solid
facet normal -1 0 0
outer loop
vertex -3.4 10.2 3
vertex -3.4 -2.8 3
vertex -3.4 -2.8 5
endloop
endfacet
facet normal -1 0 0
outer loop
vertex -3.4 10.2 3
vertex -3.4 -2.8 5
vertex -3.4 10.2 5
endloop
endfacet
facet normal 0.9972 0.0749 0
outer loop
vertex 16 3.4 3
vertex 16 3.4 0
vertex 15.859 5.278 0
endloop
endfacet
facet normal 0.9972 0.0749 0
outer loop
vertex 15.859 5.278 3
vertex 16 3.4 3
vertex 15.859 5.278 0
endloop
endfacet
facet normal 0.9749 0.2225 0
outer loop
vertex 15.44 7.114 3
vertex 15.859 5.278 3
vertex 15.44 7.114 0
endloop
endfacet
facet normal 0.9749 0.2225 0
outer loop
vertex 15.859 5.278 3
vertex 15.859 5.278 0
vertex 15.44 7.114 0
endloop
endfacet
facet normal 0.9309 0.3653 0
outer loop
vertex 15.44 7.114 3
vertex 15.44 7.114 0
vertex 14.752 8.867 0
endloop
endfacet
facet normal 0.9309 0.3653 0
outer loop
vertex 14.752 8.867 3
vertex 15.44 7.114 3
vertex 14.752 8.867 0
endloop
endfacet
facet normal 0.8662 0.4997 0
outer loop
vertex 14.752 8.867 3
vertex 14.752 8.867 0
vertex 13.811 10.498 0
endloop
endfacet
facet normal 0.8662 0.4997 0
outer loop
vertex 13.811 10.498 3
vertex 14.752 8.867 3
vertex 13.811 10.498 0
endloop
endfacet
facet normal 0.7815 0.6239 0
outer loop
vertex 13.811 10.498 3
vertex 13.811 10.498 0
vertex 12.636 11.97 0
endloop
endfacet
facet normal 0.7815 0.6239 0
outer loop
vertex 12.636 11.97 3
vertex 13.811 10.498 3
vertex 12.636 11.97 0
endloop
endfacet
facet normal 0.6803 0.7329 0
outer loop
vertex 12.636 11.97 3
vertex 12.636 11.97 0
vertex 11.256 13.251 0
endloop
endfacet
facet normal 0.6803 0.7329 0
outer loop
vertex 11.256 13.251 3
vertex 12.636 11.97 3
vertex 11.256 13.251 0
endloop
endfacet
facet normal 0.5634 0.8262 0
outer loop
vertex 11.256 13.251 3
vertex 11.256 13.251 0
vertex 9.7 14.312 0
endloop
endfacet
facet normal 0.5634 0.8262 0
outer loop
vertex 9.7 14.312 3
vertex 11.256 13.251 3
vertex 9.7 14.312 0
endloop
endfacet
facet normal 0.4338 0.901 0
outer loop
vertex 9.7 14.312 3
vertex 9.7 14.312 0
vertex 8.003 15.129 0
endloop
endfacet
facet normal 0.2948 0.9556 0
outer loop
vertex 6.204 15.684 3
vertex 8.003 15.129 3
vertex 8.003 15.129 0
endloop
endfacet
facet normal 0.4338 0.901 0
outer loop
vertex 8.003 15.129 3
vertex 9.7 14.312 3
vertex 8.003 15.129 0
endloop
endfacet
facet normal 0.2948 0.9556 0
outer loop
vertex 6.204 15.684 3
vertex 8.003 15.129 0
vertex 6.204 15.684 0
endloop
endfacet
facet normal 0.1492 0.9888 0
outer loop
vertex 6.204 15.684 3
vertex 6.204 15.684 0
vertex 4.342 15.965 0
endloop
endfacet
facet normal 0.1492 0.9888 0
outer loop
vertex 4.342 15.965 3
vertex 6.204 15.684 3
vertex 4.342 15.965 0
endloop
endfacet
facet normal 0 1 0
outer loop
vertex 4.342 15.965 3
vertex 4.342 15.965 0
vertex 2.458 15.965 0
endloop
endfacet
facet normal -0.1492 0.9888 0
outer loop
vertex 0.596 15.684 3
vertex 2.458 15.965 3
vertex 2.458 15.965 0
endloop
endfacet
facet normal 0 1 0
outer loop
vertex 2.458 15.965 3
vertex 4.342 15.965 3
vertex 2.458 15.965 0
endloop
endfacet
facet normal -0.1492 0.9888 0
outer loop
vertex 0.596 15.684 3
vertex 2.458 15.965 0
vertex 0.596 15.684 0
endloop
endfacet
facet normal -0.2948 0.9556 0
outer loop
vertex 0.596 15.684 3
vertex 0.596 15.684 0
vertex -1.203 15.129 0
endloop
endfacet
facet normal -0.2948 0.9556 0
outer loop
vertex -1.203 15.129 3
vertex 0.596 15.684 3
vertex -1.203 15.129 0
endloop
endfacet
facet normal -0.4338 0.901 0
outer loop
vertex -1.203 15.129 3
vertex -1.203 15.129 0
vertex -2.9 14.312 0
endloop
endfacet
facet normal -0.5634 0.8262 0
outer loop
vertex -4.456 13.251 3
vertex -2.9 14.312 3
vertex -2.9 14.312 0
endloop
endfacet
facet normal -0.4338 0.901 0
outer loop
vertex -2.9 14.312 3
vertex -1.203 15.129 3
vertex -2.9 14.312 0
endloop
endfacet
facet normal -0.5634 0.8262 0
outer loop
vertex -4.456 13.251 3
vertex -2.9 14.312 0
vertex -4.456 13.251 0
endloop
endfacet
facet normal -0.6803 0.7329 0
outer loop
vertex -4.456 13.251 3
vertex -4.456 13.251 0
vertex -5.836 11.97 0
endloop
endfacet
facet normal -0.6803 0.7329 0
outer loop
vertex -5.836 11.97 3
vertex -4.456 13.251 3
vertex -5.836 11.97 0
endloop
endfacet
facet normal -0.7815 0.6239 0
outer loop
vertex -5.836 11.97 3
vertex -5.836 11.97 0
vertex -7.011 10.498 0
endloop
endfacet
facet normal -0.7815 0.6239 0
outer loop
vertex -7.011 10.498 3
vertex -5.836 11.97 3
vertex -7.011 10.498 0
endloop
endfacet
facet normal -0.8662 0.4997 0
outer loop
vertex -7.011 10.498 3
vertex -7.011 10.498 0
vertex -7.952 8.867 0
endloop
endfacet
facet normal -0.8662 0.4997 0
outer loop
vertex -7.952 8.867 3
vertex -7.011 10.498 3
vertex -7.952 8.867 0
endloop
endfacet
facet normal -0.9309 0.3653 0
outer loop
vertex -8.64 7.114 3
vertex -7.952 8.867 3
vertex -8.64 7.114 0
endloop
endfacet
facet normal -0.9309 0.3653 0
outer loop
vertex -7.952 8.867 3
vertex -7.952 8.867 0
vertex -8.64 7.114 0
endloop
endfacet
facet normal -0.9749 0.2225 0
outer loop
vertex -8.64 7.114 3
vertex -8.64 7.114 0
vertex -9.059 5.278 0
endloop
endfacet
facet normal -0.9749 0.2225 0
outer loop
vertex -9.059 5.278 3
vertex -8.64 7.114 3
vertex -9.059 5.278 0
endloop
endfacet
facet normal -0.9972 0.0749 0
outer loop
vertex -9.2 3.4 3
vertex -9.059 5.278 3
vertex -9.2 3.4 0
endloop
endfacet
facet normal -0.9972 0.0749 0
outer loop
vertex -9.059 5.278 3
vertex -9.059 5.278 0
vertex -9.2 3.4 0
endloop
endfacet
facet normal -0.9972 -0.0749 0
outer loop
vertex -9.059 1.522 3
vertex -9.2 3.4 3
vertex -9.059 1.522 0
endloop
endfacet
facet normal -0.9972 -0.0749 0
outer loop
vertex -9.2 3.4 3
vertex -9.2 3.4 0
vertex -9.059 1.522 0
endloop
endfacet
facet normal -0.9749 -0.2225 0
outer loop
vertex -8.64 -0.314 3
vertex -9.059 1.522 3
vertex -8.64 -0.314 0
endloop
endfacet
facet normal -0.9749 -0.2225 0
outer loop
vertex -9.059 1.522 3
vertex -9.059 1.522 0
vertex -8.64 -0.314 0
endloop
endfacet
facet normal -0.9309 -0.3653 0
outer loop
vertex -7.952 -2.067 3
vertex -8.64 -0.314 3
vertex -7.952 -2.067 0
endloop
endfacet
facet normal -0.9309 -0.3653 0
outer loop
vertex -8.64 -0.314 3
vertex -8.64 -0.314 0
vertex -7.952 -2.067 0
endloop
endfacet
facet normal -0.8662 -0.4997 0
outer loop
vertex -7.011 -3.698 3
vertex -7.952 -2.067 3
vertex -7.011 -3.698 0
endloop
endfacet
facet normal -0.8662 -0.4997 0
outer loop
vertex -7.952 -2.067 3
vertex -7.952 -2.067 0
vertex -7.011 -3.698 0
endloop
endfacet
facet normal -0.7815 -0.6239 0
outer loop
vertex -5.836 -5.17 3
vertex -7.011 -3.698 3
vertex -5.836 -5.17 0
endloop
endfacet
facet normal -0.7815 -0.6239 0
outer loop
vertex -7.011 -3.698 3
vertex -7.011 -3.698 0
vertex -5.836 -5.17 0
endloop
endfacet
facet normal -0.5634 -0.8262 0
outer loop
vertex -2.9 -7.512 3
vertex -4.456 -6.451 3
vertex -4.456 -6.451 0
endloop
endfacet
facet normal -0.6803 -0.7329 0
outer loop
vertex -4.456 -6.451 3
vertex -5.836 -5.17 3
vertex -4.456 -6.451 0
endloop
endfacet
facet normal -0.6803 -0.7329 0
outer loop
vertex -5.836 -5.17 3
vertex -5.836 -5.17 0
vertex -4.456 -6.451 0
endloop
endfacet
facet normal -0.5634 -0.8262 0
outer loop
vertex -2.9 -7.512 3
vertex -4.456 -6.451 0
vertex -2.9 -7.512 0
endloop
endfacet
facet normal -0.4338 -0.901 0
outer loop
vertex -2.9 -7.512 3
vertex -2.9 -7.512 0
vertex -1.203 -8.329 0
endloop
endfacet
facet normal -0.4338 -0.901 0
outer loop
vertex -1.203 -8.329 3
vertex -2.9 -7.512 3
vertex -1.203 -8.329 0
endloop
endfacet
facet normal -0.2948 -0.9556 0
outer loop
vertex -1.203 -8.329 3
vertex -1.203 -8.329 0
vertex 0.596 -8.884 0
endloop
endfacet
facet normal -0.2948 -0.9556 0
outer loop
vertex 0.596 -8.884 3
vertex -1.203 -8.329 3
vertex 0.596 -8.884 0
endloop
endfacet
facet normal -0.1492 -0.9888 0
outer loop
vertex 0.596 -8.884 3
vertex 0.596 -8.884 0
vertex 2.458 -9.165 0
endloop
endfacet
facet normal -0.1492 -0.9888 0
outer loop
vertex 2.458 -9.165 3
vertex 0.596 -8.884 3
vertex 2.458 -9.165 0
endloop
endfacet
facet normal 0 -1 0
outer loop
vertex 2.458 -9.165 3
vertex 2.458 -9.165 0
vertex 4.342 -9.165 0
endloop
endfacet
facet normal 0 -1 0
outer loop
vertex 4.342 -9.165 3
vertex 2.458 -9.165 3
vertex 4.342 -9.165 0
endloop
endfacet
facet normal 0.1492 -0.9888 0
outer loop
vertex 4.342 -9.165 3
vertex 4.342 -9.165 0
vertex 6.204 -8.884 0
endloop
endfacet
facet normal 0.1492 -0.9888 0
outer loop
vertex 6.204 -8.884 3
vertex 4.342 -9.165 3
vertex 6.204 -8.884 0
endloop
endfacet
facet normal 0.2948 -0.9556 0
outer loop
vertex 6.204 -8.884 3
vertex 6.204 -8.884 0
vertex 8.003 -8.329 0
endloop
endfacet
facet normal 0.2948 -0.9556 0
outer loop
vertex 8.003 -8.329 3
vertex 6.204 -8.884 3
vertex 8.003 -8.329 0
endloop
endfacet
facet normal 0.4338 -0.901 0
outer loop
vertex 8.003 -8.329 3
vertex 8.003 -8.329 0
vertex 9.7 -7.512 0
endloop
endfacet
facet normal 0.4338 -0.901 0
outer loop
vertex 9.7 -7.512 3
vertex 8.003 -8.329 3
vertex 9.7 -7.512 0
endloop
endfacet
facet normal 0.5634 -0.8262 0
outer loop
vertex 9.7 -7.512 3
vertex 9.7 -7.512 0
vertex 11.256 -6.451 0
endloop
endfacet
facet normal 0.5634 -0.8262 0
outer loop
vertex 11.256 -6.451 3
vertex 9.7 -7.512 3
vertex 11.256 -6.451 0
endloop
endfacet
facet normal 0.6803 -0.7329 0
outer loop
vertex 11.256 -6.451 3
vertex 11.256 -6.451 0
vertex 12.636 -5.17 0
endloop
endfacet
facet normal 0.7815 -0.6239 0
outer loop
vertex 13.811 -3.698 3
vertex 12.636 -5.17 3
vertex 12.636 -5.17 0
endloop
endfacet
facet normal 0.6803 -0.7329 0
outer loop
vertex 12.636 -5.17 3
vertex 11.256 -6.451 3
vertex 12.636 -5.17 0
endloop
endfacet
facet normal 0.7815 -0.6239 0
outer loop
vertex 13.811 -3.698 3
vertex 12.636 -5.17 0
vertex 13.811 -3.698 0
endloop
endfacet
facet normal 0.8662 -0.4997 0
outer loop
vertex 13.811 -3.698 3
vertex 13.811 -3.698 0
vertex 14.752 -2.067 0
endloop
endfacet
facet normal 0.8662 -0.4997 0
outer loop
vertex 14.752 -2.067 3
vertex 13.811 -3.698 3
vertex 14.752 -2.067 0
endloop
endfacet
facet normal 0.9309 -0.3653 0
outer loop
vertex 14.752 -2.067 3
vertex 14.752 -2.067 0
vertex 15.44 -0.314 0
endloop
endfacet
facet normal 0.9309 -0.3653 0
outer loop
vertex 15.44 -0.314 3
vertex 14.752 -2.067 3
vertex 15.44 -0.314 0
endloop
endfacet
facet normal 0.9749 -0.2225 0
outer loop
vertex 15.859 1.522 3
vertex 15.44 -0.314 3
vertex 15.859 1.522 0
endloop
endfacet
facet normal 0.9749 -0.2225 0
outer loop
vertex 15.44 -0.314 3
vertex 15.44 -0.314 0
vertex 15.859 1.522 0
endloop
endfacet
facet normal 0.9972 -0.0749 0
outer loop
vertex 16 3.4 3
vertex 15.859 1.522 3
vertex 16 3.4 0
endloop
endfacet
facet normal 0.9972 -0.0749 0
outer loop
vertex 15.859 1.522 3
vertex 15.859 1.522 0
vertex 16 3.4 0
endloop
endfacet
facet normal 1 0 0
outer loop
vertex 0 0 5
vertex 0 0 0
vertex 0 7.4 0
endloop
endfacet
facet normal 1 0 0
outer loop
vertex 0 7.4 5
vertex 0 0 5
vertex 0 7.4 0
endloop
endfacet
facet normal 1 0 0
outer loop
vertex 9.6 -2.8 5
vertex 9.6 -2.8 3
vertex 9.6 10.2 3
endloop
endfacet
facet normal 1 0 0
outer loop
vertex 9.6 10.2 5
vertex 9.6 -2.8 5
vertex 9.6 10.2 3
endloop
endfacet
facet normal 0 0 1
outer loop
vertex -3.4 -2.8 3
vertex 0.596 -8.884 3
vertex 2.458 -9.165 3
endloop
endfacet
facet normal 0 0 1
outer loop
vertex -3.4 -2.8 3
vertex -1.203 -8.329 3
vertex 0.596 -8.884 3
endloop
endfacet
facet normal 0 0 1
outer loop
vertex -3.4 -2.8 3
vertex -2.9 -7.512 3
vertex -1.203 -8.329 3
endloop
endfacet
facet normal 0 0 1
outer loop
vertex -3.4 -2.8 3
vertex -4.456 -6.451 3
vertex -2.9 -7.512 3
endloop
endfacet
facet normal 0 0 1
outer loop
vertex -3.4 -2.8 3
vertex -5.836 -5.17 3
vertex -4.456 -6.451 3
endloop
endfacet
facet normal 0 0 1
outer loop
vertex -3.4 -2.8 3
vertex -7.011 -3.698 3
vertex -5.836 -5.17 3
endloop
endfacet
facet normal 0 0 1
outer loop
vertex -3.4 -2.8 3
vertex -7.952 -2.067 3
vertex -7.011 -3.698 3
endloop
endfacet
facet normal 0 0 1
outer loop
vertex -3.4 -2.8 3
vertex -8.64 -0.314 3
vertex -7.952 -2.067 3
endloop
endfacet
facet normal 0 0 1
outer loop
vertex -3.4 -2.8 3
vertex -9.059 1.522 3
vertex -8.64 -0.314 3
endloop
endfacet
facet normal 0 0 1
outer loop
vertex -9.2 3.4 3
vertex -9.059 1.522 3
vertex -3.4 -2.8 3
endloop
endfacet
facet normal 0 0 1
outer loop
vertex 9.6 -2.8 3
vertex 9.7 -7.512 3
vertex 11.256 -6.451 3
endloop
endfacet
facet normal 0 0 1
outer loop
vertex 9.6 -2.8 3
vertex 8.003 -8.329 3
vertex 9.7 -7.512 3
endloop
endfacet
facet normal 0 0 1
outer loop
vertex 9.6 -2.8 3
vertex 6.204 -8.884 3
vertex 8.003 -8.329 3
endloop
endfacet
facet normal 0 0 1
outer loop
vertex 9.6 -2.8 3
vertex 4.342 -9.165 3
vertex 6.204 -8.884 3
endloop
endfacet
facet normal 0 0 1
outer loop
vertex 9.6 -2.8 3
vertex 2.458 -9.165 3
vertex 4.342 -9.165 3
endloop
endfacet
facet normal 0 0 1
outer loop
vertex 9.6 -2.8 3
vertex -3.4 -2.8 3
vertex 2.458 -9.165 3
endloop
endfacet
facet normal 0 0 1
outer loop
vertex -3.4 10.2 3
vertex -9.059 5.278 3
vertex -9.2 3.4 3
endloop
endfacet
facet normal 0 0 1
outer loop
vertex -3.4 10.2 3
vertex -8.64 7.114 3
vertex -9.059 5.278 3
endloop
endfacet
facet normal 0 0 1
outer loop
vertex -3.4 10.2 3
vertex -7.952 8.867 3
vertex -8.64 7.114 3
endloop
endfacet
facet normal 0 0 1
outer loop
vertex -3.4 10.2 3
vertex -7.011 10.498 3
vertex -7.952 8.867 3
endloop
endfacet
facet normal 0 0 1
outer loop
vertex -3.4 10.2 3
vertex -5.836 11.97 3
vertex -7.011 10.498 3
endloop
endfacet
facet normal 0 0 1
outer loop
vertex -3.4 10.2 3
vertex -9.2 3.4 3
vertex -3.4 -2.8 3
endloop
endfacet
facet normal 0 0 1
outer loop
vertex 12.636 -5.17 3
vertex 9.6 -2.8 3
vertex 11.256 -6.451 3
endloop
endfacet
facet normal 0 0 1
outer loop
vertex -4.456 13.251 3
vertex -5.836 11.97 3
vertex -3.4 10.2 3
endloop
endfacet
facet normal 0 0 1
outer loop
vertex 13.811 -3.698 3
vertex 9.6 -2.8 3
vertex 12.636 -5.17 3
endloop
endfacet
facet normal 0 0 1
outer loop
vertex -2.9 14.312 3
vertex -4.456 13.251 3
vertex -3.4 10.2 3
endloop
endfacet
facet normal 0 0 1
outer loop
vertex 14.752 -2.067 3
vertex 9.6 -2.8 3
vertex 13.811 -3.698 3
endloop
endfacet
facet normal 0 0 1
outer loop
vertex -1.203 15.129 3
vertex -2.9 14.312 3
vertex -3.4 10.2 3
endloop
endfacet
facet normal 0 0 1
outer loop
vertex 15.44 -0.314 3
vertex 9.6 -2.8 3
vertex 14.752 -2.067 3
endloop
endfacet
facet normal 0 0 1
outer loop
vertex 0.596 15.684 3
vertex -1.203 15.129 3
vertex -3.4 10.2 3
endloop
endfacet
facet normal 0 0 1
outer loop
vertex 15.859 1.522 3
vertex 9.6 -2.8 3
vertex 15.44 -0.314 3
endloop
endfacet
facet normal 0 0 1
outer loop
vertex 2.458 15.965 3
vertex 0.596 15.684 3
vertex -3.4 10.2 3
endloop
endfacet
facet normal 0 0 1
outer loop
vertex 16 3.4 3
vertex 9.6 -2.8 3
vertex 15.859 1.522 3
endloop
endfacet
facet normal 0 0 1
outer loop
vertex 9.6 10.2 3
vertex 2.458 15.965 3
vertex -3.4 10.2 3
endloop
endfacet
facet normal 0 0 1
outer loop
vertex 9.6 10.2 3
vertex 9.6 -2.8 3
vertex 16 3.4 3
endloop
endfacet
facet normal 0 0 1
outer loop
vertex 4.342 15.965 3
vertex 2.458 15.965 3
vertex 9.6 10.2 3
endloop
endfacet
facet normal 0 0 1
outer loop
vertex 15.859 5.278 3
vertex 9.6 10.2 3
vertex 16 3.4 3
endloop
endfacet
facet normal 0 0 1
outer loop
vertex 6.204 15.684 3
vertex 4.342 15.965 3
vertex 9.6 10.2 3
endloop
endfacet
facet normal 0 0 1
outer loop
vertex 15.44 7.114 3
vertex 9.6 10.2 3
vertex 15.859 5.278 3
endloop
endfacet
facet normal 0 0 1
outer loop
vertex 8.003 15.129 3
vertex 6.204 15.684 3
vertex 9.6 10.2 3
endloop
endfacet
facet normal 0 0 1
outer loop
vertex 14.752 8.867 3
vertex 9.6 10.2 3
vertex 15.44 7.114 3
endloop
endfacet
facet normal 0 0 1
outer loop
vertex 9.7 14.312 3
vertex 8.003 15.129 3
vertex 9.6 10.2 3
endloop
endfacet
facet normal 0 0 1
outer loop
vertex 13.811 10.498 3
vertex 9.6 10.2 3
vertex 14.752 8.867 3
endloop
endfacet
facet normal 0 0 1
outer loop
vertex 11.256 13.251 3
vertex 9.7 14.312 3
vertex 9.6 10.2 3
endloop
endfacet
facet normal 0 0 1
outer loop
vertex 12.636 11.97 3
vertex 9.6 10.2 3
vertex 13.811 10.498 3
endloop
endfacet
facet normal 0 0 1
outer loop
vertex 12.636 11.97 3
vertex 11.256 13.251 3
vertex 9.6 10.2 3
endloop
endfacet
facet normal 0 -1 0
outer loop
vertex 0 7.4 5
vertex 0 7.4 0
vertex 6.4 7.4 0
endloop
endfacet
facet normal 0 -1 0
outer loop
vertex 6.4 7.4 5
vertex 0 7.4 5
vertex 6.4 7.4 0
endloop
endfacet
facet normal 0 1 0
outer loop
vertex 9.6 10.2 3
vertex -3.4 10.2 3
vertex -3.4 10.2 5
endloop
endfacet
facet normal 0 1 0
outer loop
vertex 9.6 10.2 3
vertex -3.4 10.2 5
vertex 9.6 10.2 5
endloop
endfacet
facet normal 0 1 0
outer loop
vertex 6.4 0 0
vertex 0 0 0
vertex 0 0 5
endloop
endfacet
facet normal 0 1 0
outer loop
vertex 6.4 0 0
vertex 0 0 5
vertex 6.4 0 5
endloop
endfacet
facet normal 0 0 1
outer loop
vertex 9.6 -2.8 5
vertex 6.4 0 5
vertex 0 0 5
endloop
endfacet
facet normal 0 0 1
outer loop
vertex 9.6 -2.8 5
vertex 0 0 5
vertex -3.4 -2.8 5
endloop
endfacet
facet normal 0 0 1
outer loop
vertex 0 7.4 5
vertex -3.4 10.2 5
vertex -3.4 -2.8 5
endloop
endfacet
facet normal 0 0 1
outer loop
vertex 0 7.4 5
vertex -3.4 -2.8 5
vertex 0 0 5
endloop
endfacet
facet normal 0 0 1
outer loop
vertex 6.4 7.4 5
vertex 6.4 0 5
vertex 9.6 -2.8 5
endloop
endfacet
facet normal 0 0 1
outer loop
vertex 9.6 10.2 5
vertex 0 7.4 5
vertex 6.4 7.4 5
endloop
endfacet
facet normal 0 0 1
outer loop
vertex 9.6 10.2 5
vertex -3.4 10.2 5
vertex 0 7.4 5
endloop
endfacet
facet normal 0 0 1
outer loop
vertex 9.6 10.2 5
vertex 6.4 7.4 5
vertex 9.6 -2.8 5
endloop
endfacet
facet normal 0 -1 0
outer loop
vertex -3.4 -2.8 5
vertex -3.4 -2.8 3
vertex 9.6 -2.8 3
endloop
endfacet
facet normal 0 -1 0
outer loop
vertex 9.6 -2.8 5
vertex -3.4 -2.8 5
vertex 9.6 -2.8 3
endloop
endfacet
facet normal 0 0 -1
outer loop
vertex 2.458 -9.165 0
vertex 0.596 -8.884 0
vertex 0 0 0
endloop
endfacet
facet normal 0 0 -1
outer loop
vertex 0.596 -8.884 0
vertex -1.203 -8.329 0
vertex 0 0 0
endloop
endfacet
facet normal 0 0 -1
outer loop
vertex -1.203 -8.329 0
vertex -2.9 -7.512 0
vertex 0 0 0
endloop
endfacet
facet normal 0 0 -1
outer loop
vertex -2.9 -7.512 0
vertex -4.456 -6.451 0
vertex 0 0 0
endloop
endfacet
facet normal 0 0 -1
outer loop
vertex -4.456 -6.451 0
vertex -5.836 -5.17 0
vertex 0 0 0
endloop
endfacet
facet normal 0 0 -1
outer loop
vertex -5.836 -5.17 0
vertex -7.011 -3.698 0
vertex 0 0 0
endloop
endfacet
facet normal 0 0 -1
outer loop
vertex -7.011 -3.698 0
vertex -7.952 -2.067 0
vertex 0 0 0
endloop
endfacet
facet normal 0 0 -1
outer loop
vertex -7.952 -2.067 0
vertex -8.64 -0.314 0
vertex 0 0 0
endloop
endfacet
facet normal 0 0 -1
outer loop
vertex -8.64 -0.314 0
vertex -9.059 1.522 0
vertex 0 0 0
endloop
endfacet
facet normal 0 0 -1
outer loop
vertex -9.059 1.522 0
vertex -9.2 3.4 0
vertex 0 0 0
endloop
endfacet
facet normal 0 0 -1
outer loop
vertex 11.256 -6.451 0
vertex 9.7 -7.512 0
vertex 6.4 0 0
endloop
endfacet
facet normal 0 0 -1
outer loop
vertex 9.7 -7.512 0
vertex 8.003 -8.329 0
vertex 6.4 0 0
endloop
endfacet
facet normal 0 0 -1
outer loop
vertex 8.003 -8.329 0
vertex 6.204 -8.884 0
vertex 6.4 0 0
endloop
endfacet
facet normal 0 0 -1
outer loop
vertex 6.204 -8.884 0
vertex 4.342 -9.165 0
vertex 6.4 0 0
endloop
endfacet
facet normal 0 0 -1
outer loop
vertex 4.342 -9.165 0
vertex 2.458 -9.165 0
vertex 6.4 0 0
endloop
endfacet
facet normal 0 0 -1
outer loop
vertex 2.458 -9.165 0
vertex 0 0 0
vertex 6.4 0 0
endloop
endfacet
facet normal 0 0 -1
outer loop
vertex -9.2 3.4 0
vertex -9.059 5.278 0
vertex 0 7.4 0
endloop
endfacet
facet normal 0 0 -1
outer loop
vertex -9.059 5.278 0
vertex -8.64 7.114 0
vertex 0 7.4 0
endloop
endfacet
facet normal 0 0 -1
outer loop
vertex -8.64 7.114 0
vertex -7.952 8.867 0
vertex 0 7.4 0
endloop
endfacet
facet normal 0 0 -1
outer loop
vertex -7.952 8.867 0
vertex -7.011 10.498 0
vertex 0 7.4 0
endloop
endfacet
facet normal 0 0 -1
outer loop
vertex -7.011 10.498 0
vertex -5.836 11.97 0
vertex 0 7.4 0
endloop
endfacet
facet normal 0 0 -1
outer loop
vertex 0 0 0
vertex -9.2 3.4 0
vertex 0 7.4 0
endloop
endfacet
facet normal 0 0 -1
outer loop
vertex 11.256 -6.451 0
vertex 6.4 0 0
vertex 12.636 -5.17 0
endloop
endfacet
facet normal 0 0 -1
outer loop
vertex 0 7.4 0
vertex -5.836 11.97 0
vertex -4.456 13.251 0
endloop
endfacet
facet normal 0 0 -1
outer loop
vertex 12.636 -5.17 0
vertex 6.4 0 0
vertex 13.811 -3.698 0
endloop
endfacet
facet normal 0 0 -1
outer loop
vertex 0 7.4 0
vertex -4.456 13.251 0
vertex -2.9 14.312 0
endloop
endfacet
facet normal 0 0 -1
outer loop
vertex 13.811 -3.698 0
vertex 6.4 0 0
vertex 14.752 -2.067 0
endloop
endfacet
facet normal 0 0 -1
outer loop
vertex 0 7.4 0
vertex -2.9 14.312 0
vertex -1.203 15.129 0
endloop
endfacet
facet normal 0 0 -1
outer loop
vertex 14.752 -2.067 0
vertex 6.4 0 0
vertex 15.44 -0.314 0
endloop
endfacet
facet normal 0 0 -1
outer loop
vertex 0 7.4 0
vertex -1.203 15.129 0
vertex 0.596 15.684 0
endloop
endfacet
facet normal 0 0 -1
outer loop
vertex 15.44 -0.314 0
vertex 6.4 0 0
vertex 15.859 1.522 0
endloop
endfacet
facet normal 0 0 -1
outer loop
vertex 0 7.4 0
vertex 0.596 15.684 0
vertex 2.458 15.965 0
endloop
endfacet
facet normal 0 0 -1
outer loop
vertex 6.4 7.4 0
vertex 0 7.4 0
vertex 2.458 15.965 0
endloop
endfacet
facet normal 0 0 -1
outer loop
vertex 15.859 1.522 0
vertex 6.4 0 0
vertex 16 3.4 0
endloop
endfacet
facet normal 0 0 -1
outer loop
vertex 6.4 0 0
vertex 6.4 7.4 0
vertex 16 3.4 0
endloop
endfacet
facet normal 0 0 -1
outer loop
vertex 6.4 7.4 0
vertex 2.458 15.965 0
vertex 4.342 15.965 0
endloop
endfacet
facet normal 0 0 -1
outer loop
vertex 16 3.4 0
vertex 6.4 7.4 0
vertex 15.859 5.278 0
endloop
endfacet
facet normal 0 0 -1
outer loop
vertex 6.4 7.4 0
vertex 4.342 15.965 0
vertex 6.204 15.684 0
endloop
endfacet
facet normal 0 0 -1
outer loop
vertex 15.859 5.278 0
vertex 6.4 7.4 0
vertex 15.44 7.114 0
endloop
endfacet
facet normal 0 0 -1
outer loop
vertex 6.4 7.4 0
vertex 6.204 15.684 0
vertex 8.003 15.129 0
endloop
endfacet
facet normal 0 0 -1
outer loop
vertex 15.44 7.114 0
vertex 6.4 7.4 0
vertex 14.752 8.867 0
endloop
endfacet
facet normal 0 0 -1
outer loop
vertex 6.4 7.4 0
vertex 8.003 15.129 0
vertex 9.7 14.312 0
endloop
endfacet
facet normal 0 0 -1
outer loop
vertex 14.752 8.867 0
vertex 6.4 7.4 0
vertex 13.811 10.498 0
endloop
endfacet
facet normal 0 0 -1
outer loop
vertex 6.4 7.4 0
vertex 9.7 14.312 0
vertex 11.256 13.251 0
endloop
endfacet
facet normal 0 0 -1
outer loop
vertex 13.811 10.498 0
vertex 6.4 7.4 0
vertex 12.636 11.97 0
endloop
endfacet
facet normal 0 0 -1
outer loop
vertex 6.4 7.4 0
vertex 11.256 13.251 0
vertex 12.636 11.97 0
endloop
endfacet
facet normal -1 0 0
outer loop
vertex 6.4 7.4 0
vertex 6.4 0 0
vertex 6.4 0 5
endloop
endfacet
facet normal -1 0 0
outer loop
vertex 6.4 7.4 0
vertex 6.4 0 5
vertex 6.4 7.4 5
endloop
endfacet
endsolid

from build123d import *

# Parameters (mm, degrees)
CYLINDER003_R     = 12.6
CYLINDER003_DEPTH = 17
BOX_W             = 6.4
BOX_H             = 7.4
BOX_DEPTH         = 10
CYLINDER002_R     = 15.4
CYLINDER002_DEPTH = 3
CYLINDER001_R     = 14.4
CYLINDER001_DEPTH = 12
CYLINDER_R        = 17.4
CYLINDER_DEPTH    = 10
BOX001_W          = 13
BOX001_H          = 13
BOX001_DEPTH      = 5


with BuildPart() as cylinder003:
    # Cylinder003 → Cylinder003 (new body)
    with BuildSketch(Plane(origin=(3.4, 3.4, -6), x_dir=(1, 0, 0), z_dir=(0, 0, 1))):
        Circle(CYLINDER003_R)
    extrude(amount=CYLINDER003_DEPTH)


with BuildPart() as cube:
    # Box → Box (new body)
    with BuildSketch(Plane.XY):
        with Locations((3.2, 3.7)):
            Rectangle(BOX_W, BOX_H)
    extrude(amount=BOX_DEPTH)


with BuildPart() as cylinder002:
    # Cylinder002 → Cylinder002 (new body)
    with BuildSketch(Plane(origin=(3.2, 3.5, 0), x_dir=(1, 0, 0), z_dir=(0, 0, 1))):
        Circle(CYLINDER002_R)
    extrude(amount=CYLINDER002_DEPTH)


with BuildPart() as cylinder001:
    # Cylinder001 → Cylinder001 (new body)
    with BuildSketch(Plane(origin=(3.2, 3.5, 0), x_dir=(1, 0, 0), z_dir=(0, 0, 1))):
        Circle(CYLINDER001_R)
    extrude(amount=CYLINDER001_DEPTH)


with BuildPart() as cut:
    # Cylinder → Cylinder (new body)
    with BuildSketch(Plane(origin=(3.2, 3.5, 0), x_dir=(1, 0, 0), z_dir=(0, 0, 1))):
        Circle(CYLINDER_R)
    extrude(amount=CYLINDER_DEPTH)

    # Cut: cut Cylinder001
    add(cylinder001.part, mode=Mode.SUBTRACT)


with BuildPart() as common:
    # Box001 → Box001 (new body)
    with BuildSketch(Plane(origin=(-3.4, -2.8, 0), x_dir=(1, 0, 0), z_dir=(0, 0, 1))):
        with Locations((6.5, 6.5)):
            Rectangle(BOX001_W, BOX001_H)
    extrude(amount=BOX001_DEPTH)

    # Fusion: union Cylinder002, Cut
    add(cylinder002.part)
    add(cut.part)

    # Cut001: cut Cube
    add(cube.part, mode=Mode.SUBTRACT)

    # Common: intersect Cylinder003
    add(cylinder003.part, mode=Mode.INTERSECT)


solid = common.part
